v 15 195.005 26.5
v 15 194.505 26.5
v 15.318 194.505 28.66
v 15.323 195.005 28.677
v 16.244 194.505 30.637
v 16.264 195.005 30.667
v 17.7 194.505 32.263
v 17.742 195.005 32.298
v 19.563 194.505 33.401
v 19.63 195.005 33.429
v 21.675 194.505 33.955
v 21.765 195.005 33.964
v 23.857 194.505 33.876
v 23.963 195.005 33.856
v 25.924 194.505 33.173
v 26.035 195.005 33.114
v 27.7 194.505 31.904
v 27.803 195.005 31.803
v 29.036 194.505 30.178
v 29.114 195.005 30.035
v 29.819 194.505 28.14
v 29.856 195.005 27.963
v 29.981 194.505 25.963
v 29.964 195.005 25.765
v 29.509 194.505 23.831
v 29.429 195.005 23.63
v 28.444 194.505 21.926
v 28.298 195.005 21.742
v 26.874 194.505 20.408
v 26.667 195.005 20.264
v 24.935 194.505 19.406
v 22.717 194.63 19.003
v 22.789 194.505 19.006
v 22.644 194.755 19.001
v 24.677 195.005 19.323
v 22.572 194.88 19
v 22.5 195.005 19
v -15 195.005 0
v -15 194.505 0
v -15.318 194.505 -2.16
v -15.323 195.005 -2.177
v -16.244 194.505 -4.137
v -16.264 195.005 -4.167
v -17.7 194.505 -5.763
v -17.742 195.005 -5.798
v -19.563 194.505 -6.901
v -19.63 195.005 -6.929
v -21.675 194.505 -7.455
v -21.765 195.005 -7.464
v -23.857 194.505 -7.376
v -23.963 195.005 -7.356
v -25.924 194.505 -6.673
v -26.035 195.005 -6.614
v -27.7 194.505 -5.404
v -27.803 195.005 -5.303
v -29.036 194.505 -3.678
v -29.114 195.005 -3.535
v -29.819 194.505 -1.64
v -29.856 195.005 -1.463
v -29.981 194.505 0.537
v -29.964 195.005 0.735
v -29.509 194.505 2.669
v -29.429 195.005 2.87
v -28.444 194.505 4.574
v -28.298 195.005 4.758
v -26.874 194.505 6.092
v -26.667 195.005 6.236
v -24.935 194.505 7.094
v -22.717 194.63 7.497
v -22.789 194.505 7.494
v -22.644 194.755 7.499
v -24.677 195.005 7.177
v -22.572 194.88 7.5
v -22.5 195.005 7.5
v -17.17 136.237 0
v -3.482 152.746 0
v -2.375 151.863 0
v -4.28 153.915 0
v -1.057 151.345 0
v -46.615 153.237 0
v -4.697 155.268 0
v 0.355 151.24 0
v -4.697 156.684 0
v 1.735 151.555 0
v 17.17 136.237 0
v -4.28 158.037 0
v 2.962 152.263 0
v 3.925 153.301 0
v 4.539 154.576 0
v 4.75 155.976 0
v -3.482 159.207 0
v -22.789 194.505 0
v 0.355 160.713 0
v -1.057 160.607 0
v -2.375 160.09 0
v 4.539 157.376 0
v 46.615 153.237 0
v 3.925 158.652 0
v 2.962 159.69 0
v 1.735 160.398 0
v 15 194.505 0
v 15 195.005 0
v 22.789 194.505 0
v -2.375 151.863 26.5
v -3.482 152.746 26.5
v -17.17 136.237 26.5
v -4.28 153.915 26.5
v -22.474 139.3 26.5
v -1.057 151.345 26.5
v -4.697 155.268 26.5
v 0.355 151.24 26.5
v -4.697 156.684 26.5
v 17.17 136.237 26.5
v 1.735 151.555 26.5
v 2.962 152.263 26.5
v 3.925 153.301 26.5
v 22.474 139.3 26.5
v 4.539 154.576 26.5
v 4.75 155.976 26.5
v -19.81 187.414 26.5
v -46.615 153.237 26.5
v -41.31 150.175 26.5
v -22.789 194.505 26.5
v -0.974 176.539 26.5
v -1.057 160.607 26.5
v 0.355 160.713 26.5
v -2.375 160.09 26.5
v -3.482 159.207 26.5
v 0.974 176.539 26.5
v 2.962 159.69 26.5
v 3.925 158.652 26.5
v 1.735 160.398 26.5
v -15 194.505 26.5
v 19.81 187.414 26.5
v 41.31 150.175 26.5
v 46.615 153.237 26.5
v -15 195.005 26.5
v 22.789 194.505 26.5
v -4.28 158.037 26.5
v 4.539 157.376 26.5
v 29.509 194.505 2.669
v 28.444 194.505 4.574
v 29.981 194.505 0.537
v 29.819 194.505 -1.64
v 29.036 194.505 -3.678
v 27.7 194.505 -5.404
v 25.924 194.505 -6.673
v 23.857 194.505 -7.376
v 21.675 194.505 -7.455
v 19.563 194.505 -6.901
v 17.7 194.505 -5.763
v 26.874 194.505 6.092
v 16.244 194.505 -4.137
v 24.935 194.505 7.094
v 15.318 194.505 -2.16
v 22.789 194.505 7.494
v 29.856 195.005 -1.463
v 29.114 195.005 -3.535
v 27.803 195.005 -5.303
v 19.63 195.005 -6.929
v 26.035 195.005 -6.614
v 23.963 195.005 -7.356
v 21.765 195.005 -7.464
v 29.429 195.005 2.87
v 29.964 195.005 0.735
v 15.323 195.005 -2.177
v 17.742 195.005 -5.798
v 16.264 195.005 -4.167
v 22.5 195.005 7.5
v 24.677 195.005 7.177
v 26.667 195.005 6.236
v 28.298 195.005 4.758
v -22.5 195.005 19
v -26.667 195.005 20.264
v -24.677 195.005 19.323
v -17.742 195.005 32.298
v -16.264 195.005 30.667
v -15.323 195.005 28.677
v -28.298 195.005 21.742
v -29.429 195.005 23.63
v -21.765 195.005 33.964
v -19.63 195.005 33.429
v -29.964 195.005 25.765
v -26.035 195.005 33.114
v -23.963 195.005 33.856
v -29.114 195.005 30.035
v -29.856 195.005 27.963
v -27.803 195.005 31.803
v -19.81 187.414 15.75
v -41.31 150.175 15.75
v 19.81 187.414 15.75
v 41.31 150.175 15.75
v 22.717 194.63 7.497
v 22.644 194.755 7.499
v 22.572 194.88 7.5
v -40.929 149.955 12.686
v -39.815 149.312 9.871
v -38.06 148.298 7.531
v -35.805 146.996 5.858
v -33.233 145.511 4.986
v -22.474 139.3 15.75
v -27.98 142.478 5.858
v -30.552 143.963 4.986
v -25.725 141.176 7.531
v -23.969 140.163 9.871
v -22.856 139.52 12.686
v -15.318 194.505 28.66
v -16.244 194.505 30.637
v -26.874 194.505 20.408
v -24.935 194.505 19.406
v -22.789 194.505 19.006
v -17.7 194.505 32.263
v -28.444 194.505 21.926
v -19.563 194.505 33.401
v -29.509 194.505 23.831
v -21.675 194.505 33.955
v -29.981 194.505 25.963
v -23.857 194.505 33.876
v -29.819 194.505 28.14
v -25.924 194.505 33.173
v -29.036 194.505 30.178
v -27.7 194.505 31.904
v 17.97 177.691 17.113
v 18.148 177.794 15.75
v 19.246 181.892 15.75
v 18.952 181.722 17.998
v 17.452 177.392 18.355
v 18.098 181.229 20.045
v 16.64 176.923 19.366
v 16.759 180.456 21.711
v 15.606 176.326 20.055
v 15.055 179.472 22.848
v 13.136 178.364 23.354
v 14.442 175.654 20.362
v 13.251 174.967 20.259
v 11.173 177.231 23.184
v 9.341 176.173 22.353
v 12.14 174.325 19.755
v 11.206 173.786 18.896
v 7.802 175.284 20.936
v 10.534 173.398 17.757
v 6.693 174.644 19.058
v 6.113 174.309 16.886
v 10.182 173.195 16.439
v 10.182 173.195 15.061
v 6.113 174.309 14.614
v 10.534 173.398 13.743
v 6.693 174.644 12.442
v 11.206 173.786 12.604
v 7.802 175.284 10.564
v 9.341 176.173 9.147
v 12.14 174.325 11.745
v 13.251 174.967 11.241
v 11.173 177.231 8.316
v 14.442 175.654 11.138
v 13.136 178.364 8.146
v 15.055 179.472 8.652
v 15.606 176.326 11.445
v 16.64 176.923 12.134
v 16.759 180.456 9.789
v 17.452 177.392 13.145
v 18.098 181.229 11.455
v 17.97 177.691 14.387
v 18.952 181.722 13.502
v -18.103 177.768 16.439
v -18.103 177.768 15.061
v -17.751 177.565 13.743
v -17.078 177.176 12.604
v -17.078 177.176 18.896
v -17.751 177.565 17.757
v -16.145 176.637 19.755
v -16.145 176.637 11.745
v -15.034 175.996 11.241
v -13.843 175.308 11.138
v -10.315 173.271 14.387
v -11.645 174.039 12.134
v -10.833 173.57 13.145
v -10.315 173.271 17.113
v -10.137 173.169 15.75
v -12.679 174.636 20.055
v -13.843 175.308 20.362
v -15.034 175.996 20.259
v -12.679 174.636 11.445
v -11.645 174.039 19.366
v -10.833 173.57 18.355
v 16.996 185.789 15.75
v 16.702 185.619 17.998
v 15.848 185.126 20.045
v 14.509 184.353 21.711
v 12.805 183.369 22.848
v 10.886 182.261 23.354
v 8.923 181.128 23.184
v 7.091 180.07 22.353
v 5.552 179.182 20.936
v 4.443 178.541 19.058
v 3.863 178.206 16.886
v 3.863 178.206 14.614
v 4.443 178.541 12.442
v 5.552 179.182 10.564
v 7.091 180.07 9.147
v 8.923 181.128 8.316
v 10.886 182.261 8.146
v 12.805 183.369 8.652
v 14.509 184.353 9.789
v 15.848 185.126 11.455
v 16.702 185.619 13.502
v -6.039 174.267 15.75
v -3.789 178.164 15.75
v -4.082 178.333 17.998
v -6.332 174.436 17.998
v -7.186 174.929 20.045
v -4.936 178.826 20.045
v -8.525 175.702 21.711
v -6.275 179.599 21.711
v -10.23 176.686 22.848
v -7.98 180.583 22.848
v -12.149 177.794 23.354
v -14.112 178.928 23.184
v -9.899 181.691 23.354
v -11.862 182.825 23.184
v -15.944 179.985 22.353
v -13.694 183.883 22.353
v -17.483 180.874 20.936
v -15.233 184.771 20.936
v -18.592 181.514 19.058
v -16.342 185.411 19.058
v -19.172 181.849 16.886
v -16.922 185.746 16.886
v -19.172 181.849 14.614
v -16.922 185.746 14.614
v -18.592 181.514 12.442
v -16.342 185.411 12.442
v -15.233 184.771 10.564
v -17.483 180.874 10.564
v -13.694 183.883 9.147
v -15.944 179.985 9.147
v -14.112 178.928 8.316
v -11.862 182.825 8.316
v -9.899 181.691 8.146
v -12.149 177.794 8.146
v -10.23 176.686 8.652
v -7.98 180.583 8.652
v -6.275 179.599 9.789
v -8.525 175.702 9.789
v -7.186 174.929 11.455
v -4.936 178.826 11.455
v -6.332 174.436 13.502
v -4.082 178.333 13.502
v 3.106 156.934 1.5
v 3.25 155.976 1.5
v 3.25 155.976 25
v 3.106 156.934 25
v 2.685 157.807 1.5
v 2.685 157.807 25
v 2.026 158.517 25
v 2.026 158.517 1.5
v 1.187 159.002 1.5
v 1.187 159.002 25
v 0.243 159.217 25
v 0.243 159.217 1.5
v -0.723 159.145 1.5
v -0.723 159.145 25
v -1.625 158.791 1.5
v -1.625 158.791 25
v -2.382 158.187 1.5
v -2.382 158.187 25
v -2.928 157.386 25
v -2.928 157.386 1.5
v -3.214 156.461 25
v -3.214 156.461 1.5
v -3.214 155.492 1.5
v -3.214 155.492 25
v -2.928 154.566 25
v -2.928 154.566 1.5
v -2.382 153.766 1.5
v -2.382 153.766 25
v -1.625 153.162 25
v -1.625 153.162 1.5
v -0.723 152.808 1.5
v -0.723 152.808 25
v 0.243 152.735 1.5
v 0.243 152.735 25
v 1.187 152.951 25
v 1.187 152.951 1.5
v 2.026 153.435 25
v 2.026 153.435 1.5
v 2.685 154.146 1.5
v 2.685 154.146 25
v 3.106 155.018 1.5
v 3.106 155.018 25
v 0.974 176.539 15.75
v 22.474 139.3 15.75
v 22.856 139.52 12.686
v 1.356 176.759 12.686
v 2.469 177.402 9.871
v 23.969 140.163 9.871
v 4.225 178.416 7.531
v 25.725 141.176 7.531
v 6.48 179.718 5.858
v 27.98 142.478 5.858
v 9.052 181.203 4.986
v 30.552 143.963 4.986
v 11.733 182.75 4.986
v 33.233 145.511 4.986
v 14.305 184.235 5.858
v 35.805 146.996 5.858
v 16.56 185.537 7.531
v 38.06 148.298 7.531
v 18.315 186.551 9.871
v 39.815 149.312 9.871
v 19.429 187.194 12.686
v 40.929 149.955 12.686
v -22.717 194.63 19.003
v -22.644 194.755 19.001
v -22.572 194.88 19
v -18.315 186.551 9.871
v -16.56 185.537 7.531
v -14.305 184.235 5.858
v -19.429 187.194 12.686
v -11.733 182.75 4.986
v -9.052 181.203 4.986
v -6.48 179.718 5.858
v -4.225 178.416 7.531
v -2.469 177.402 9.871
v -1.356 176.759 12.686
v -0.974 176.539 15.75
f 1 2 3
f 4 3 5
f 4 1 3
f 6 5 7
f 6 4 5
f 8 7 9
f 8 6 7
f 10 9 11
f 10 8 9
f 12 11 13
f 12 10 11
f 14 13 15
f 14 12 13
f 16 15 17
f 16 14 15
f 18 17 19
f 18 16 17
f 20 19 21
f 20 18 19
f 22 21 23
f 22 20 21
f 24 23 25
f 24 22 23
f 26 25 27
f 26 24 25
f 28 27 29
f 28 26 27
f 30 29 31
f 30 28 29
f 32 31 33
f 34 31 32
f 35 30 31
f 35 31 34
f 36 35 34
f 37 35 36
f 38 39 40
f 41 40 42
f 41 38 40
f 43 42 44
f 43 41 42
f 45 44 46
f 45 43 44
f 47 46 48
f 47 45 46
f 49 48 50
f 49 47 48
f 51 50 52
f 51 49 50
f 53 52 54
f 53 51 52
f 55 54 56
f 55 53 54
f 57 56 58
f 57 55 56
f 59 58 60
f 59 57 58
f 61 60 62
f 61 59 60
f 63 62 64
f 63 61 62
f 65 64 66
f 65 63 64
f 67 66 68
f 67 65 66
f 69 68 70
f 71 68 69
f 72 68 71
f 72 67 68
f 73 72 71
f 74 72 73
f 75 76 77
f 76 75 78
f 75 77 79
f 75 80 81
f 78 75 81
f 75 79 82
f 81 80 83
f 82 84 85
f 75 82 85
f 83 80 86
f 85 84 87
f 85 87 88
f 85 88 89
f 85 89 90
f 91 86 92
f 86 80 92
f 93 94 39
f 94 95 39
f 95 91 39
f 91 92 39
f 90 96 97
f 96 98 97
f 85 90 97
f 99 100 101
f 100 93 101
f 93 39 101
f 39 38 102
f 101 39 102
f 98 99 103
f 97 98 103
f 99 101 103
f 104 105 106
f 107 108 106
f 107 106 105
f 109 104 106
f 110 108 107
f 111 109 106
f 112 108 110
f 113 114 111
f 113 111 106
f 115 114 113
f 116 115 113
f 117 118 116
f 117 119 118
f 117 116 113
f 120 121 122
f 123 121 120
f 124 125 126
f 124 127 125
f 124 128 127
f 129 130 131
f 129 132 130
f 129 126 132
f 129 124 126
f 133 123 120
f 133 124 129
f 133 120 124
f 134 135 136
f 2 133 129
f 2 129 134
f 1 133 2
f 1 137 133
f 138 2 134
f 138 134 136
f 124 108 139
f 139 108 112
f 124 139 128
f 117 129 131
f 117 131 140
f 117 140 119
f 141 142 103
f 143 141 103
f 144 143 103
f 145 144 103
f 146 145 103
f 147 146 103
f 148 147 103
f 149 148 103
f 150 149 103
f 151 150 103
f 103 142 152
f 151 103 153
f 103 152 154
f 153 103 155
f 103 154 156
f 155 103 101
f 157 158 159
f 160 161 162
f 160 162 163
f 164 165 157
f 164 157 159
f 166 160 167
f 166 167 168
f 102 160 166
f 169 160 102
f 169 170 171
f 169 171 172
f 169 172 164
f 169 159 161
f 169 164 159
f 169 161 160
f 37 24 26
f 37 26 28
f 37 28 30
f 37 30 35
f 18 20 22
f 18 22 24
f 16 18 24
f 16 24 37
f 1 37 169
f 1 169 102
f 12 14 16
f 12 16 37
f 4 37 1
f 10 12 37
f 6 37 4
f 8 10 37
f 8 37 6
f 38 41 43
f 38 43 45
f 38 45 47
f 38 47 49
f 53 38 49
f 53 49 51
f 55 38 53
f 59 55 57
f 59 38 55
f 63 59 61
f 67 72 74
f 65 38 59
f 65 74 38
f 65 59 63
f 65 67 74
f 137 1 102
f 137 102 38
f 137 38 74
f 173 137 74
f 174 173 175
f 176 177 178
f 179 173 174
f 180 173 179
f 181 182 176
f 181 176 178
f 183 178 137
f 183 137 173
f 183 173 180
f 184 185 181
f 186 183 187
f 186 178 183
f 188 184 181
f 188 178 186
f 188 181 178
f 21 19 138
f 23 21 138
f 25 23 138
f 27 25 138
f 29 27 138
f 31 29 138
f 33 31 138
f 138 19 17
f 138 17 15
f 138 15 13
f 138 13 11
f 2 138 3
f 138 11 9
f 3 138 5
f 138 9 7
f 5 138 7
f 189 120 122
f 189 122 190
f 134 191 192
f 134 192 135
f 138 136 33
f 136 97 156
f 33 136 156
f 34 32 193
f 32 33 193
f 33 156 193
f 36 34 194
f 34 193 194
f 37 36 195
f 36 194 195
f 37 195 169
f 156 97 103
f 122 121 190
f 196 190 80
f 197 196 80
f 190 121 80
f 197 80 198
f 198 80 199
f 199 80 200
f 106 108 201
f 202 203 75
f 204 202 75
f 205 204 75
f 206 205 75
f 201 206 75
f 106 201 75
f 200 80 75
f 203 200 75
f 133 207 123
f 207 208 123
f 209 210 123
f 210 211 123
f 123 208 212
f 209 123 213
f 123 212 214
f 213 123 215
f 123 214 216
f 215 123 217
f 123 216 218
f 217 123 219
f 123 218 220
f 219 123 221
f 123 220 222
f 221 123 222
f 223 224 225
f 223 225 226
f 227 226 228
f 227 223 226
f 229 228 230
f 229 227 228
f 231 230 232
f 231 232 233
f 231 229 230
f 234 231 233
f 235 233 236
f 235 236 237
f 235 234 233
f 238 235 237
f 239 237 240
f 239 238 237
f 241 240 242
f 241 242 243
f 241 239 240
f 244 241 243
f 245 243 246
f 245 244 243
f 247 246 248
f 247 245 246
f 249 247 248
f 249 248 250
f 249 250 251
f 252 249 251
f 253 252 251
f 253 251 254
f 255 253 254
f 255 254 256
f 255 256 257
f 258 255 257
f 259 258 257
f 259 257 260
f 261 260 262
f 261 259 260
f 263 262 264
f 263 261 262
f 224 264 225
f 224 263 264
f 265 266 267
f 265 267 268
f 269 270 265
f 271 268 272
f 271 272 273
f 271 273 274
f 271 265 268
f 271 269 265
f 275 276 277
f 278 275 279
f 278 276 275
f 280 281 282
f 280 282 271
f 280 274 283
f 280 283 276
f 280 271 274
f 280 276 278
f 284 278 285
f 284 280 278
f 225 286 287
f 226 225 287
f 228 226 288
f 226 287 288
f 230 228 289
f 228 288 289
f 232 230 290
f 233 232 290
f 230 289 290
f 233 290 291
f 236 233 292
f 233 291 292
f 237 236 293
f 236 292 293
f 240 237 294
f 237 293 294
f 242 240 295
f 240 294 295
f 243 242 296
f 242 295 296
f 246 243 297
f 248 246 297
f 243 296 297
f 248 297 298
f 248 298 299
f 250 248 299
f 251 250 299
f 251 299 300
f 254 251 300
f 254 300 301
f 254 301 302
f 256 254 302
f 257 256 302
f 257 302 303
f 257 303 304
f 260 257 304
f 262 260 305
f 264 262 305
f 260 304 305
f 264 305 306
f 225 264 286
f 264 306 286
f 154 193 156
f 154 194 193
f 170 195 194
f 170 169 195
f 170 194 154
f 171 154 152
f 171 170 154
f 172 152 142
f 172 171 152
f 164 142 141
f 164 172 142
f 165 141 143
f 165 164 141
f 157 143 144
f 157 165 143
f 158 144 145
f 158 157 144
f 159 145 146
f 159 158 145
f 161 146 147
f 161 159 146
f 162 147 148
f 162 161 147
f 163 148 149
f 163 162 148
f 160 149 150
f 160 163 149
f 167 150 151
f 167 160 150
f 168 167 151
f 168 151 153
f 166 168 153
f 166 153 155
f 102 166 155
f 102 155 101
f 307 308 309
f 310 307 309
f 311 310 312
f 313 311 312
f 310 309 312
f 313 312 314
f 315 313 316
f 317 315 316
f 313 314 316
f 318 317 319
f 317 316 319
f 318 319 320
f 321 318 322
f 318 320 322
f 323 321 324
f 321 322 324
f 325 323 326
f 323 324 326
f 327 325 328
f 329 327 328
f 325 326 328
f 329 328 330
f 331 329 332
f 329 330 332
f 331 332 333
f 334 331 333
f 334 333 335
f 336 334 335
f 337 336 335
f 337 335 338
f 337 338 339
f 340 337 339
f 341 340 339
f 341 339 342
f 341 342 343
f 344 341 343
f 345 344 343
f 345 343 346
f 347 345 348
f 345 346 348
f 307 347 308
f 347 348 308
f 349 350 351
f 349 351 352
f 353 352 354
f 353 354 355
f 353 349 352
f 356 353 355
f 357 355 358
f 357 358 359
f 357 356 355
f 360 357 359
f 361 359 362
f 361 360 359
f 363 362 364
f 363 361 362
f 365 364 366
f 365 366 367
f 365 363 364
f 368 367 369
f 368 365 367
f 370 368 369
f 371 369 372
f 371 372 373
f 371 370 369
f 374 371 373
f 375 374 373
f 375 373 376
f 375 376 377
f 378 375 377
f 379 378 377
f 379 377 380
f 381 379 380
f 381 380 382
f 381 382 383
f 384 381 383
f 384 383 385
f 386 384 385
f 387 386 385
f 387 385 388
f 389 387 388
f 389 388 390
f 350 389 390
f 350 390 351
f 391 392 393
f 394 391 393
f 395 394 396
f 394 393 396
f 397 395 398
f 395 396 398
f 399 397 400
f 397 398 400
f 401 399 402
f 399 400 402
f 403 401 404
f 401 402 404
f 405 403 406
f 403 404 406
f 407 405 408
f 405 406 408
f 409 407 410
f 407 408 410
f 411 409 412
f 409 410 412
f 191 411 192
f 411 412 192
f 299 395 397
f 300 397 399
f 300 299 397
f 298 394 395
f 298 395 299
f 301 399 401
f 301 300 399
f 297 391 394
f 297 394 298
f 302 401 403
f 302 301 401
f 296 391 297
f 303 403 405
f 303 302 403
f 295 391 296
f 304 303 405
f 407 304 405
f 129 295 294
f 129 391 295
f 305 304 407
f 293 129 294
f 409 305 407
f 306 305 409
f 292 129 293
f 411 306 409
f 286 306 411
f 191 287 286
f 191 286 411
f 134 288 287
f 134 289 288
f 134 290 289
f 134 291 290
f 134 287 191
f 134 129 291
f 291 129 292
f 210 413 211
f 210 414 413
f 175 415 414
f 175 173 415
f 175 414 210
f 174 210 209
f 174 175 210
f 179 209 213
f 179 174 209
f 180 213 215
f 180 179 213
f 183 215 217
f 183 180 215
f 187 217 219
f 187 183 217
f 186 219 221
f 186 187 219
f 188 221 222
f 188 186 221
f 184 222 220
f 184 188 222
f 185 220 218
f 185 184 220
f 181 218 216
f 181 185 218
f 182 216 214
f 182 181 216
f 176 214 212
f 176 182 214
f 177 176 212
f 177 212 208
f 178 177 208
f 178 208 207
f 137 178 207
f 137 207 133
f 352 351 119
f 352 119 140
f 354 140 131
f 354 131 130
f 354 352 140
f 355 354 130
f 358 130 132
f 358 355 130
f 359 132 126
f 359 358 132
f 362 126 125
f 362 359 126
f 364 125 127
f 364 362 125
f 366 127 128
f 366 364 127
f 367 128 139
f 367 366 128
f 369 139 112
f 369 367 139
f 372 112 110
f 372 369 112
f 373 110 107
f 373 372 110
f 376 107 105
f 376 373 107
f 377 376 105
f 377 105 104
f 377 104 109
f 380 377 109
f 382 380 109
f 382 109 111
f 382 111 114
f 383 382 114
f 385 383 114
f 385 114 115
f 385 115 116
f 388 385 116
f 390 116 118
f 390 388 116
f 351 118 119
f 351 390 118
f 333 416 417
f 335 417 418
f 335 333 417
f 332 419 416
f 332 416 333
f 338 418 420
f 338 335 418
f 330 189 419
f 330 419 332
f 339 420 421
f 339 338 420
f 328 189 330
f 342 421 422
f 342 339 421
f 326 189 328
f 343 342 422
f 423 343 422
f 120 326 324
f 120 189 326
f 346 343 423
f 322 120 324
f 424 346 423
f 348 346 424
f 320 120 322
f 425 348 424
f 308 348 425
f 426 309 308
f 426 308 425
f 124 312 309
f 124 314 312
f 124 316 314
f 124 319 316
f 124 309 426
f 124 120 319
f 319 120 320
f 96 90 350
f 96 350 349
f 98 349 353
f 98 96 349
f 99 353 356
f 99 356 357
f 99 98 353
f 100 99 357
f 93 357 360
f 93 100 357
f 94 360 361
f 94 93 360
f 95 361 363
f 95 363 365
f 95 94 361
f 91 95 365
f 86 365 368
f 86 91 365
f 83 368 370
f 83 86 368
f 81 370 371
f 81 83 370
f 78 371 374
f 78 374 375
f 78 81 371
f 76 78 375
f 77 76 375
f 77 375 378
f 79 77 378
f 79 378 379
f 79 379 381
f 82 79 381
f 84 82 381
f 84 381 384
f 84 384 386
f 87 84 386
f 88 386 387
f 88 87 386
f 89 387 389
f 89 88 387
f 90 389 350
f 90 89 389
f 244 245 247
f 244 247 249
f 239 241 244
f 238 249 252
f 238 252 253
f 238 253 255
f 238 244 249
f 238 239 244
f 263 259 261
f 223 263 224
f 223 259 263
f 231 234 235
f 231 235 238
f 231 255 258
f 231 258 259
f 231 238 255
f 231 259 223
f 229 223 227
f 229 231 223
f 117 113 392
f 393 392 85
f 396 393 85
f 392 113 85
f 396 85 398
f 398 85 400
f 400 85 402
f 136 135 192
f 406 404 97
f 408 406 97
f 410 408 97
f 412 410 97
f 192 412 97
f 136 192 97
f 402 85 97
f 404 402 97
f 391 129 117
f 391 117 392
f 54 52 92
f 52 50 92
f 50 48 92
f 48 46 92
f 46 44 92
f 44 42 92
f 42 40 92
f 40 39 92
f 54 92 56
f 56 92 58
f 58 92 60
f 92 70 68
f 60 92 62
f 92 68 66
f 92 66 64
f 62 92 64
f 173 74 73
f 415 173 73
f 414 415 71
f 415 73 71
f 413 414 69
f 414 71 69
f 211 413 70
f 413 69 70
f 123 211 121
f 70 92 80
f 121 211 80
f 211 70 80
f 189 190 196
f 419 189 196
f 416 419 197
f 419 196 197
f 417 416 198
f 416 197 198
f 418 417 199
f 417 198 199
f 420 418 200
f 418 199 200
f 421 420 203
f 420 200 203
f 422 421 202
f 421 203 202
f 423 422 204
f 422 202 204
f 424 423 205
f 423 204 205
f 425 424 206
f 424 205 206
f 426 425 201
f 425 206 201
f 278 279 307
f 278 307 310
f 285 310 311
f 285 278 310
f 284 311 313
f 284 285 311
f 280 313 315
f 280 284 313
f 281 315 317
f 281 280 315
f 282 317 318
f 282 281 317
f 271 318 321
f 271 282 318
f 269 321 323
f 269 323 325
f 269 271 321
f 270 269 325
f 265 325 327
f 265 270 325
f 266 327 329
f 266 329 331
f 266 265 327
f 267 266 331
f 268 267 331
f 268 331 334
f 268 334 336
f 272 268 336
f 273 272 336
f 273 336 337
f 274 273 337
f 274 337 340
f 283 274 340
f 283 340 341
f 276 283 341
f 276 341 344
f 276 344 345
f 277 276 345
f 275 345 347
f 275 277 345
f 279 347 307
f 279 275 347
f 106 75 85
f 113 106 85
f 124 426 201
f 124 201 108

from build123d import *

# Parameters (mm, degrees)
F0_R      = 3.25
F1_DEPTH  = 31.5
F3_DEPTH  = 43
F5_DEPTH  = 43
F6_R      = 7.625
F7_DEPTH  = 7.5
F8_R      = 7.625
F9_DEPTH  = 7.5
F10_SIZE  = 3
F11_DEPTH = 5
F12_SIZE  = 1.5
F13_R     = 7.5
F14_DEPTH = 0.5


with BuildPart() as f1:
    # F0 (on Top) → F1 (new body)
    with BuildSketch(Plane.XY):
        Polygon((22.5, 195.0052188787), (-22.5, 195.0052188787), (-46.6147367097, 153.2372696863), (-17.1698729811, 136.2372696863), (17.1698729811, 136.2372696863), (46.6147367097, 153.2372696863), align=None)
        with Locations((0, 155.976362049)):
            Circle(F0_R, mode=Mode.SUBTRACT)
    extrude(amount=F1_DEPTH)

    # F2 (on face) → F3 (cut)
    with BuildSketch(Plane(origin=(54.7, 94.743179174, 0), x_dir=(0.8660254038, -0.5, 0), z_dir=(-0.5, -0.8660254038, 0))):
        with BuildLine():
            Line((-110.8631810245, 31.5), (-110.8631810245, 15.75))
            ThreePointArc((-110.8631810245, 15.75), (-99.9881810245, 4.875), (-89.1131810245, 15.75))
            Line((-89.1131810245, 15.75), (-89.1131810245, 31.5))
            Line((-89.1131810245, 31.5), (-110.8631810245, 31.5))
        make_face()
    extrude(amount=-F3_DEPTH, mode=Mode.SUBTRACT)

    # F4 (on face) → F5 (cut)
    with BuildSketch(Plane(origin=(-54.7, 94.743179174, 0), x_dir=(0.8660254038, 0.5, 0), z_dir=(0.5, -0.8660254038, 0))):
        with BuildLine():
            Line((89.1131810245, 31.5), (89.1131810245, 15.75))
            ThreePointArc((89.1131810245, 15.75), (99.9881810245, 4.875), (110.8631810245, 15.75))
            Line((110.8631810245, 15.75), (110.8631810245, 31.5))
            Line((110.8631810245, 31.5), (89.1131810245, 31.5))
        make_face()
    extrude(amount=-F5_DEPTH, mode=Mode.SUBTRACT)

    # F6 (on face) → F7 (join)
    with BuildSketch(Plane(origin=(76.2, 131.9822715367, 0), x_dir=(0.8660254038, -0.5, 0), z_dir=(-0.5, -0.8660254038, 0))):
        with Locations((-99.9881810245, 15.75)):
            Circle(F6_R)
    extrude(amount=F7_DEPTH)

    # F8 (on face) → F9 (join)
    with BuildSketch(Plane(origin=(-76.2, 131.9822715367, 0), x_dir=(0.8660254038, 0.5, 0), z_dir=(0.5, -0.8660254038, 0))):
        with Locations((99.9881810245, 15.75)):
            Circle(F8_R)
    extrude(amount=F9_DEPTH)

    # F10
    f10_edges = [f1.edges().sort_by_distance(p)[0] for p in [
        (-20.745749, 179.293672, 15.75),
        (7.538861, 171.668672, 15.75),
    ]]
    chamfer(f10_edges, length=F10_SIZE)

    # F11 (cut): a face of the model
    f11_faces = [f1.faces().sort_by_distance(p)[0] for p in [
        (0, 166.034633576, 31.5),
    ]]
    extrude(f11_faces, amount=-F11_DEPTH, mode=Mode.SUBTRACT)

    # F12
    f12_edges = [f1.edges().sort_by_distance(p)[0] for p in [
        (-3.25, 155.976362, 26.5),
        (-3.25, 155.976362, 0),
    ]]
    chamfer(f12_edges, length=F12_SIZE)

    # F13 (on face) → F14 (join)
    with BuildSketch(Plane(origin=(0, 195.0052188787, 0), x_dir=(-1, 0, 0), z_dir=(0, 1, 0))):
        with Locations((-22.5, 26.5)):
            Circle(F13_R)
        with Locations((22.5, 26.5)):
            Circle(F13_R)
        with Locations((22.5, 0)):
            Circle(F13_R)
        with Locations((-22.5, 0)):
            Circle(F13_R)
    extrude(amount=-F14_DEPTH)


solid = f1.part
